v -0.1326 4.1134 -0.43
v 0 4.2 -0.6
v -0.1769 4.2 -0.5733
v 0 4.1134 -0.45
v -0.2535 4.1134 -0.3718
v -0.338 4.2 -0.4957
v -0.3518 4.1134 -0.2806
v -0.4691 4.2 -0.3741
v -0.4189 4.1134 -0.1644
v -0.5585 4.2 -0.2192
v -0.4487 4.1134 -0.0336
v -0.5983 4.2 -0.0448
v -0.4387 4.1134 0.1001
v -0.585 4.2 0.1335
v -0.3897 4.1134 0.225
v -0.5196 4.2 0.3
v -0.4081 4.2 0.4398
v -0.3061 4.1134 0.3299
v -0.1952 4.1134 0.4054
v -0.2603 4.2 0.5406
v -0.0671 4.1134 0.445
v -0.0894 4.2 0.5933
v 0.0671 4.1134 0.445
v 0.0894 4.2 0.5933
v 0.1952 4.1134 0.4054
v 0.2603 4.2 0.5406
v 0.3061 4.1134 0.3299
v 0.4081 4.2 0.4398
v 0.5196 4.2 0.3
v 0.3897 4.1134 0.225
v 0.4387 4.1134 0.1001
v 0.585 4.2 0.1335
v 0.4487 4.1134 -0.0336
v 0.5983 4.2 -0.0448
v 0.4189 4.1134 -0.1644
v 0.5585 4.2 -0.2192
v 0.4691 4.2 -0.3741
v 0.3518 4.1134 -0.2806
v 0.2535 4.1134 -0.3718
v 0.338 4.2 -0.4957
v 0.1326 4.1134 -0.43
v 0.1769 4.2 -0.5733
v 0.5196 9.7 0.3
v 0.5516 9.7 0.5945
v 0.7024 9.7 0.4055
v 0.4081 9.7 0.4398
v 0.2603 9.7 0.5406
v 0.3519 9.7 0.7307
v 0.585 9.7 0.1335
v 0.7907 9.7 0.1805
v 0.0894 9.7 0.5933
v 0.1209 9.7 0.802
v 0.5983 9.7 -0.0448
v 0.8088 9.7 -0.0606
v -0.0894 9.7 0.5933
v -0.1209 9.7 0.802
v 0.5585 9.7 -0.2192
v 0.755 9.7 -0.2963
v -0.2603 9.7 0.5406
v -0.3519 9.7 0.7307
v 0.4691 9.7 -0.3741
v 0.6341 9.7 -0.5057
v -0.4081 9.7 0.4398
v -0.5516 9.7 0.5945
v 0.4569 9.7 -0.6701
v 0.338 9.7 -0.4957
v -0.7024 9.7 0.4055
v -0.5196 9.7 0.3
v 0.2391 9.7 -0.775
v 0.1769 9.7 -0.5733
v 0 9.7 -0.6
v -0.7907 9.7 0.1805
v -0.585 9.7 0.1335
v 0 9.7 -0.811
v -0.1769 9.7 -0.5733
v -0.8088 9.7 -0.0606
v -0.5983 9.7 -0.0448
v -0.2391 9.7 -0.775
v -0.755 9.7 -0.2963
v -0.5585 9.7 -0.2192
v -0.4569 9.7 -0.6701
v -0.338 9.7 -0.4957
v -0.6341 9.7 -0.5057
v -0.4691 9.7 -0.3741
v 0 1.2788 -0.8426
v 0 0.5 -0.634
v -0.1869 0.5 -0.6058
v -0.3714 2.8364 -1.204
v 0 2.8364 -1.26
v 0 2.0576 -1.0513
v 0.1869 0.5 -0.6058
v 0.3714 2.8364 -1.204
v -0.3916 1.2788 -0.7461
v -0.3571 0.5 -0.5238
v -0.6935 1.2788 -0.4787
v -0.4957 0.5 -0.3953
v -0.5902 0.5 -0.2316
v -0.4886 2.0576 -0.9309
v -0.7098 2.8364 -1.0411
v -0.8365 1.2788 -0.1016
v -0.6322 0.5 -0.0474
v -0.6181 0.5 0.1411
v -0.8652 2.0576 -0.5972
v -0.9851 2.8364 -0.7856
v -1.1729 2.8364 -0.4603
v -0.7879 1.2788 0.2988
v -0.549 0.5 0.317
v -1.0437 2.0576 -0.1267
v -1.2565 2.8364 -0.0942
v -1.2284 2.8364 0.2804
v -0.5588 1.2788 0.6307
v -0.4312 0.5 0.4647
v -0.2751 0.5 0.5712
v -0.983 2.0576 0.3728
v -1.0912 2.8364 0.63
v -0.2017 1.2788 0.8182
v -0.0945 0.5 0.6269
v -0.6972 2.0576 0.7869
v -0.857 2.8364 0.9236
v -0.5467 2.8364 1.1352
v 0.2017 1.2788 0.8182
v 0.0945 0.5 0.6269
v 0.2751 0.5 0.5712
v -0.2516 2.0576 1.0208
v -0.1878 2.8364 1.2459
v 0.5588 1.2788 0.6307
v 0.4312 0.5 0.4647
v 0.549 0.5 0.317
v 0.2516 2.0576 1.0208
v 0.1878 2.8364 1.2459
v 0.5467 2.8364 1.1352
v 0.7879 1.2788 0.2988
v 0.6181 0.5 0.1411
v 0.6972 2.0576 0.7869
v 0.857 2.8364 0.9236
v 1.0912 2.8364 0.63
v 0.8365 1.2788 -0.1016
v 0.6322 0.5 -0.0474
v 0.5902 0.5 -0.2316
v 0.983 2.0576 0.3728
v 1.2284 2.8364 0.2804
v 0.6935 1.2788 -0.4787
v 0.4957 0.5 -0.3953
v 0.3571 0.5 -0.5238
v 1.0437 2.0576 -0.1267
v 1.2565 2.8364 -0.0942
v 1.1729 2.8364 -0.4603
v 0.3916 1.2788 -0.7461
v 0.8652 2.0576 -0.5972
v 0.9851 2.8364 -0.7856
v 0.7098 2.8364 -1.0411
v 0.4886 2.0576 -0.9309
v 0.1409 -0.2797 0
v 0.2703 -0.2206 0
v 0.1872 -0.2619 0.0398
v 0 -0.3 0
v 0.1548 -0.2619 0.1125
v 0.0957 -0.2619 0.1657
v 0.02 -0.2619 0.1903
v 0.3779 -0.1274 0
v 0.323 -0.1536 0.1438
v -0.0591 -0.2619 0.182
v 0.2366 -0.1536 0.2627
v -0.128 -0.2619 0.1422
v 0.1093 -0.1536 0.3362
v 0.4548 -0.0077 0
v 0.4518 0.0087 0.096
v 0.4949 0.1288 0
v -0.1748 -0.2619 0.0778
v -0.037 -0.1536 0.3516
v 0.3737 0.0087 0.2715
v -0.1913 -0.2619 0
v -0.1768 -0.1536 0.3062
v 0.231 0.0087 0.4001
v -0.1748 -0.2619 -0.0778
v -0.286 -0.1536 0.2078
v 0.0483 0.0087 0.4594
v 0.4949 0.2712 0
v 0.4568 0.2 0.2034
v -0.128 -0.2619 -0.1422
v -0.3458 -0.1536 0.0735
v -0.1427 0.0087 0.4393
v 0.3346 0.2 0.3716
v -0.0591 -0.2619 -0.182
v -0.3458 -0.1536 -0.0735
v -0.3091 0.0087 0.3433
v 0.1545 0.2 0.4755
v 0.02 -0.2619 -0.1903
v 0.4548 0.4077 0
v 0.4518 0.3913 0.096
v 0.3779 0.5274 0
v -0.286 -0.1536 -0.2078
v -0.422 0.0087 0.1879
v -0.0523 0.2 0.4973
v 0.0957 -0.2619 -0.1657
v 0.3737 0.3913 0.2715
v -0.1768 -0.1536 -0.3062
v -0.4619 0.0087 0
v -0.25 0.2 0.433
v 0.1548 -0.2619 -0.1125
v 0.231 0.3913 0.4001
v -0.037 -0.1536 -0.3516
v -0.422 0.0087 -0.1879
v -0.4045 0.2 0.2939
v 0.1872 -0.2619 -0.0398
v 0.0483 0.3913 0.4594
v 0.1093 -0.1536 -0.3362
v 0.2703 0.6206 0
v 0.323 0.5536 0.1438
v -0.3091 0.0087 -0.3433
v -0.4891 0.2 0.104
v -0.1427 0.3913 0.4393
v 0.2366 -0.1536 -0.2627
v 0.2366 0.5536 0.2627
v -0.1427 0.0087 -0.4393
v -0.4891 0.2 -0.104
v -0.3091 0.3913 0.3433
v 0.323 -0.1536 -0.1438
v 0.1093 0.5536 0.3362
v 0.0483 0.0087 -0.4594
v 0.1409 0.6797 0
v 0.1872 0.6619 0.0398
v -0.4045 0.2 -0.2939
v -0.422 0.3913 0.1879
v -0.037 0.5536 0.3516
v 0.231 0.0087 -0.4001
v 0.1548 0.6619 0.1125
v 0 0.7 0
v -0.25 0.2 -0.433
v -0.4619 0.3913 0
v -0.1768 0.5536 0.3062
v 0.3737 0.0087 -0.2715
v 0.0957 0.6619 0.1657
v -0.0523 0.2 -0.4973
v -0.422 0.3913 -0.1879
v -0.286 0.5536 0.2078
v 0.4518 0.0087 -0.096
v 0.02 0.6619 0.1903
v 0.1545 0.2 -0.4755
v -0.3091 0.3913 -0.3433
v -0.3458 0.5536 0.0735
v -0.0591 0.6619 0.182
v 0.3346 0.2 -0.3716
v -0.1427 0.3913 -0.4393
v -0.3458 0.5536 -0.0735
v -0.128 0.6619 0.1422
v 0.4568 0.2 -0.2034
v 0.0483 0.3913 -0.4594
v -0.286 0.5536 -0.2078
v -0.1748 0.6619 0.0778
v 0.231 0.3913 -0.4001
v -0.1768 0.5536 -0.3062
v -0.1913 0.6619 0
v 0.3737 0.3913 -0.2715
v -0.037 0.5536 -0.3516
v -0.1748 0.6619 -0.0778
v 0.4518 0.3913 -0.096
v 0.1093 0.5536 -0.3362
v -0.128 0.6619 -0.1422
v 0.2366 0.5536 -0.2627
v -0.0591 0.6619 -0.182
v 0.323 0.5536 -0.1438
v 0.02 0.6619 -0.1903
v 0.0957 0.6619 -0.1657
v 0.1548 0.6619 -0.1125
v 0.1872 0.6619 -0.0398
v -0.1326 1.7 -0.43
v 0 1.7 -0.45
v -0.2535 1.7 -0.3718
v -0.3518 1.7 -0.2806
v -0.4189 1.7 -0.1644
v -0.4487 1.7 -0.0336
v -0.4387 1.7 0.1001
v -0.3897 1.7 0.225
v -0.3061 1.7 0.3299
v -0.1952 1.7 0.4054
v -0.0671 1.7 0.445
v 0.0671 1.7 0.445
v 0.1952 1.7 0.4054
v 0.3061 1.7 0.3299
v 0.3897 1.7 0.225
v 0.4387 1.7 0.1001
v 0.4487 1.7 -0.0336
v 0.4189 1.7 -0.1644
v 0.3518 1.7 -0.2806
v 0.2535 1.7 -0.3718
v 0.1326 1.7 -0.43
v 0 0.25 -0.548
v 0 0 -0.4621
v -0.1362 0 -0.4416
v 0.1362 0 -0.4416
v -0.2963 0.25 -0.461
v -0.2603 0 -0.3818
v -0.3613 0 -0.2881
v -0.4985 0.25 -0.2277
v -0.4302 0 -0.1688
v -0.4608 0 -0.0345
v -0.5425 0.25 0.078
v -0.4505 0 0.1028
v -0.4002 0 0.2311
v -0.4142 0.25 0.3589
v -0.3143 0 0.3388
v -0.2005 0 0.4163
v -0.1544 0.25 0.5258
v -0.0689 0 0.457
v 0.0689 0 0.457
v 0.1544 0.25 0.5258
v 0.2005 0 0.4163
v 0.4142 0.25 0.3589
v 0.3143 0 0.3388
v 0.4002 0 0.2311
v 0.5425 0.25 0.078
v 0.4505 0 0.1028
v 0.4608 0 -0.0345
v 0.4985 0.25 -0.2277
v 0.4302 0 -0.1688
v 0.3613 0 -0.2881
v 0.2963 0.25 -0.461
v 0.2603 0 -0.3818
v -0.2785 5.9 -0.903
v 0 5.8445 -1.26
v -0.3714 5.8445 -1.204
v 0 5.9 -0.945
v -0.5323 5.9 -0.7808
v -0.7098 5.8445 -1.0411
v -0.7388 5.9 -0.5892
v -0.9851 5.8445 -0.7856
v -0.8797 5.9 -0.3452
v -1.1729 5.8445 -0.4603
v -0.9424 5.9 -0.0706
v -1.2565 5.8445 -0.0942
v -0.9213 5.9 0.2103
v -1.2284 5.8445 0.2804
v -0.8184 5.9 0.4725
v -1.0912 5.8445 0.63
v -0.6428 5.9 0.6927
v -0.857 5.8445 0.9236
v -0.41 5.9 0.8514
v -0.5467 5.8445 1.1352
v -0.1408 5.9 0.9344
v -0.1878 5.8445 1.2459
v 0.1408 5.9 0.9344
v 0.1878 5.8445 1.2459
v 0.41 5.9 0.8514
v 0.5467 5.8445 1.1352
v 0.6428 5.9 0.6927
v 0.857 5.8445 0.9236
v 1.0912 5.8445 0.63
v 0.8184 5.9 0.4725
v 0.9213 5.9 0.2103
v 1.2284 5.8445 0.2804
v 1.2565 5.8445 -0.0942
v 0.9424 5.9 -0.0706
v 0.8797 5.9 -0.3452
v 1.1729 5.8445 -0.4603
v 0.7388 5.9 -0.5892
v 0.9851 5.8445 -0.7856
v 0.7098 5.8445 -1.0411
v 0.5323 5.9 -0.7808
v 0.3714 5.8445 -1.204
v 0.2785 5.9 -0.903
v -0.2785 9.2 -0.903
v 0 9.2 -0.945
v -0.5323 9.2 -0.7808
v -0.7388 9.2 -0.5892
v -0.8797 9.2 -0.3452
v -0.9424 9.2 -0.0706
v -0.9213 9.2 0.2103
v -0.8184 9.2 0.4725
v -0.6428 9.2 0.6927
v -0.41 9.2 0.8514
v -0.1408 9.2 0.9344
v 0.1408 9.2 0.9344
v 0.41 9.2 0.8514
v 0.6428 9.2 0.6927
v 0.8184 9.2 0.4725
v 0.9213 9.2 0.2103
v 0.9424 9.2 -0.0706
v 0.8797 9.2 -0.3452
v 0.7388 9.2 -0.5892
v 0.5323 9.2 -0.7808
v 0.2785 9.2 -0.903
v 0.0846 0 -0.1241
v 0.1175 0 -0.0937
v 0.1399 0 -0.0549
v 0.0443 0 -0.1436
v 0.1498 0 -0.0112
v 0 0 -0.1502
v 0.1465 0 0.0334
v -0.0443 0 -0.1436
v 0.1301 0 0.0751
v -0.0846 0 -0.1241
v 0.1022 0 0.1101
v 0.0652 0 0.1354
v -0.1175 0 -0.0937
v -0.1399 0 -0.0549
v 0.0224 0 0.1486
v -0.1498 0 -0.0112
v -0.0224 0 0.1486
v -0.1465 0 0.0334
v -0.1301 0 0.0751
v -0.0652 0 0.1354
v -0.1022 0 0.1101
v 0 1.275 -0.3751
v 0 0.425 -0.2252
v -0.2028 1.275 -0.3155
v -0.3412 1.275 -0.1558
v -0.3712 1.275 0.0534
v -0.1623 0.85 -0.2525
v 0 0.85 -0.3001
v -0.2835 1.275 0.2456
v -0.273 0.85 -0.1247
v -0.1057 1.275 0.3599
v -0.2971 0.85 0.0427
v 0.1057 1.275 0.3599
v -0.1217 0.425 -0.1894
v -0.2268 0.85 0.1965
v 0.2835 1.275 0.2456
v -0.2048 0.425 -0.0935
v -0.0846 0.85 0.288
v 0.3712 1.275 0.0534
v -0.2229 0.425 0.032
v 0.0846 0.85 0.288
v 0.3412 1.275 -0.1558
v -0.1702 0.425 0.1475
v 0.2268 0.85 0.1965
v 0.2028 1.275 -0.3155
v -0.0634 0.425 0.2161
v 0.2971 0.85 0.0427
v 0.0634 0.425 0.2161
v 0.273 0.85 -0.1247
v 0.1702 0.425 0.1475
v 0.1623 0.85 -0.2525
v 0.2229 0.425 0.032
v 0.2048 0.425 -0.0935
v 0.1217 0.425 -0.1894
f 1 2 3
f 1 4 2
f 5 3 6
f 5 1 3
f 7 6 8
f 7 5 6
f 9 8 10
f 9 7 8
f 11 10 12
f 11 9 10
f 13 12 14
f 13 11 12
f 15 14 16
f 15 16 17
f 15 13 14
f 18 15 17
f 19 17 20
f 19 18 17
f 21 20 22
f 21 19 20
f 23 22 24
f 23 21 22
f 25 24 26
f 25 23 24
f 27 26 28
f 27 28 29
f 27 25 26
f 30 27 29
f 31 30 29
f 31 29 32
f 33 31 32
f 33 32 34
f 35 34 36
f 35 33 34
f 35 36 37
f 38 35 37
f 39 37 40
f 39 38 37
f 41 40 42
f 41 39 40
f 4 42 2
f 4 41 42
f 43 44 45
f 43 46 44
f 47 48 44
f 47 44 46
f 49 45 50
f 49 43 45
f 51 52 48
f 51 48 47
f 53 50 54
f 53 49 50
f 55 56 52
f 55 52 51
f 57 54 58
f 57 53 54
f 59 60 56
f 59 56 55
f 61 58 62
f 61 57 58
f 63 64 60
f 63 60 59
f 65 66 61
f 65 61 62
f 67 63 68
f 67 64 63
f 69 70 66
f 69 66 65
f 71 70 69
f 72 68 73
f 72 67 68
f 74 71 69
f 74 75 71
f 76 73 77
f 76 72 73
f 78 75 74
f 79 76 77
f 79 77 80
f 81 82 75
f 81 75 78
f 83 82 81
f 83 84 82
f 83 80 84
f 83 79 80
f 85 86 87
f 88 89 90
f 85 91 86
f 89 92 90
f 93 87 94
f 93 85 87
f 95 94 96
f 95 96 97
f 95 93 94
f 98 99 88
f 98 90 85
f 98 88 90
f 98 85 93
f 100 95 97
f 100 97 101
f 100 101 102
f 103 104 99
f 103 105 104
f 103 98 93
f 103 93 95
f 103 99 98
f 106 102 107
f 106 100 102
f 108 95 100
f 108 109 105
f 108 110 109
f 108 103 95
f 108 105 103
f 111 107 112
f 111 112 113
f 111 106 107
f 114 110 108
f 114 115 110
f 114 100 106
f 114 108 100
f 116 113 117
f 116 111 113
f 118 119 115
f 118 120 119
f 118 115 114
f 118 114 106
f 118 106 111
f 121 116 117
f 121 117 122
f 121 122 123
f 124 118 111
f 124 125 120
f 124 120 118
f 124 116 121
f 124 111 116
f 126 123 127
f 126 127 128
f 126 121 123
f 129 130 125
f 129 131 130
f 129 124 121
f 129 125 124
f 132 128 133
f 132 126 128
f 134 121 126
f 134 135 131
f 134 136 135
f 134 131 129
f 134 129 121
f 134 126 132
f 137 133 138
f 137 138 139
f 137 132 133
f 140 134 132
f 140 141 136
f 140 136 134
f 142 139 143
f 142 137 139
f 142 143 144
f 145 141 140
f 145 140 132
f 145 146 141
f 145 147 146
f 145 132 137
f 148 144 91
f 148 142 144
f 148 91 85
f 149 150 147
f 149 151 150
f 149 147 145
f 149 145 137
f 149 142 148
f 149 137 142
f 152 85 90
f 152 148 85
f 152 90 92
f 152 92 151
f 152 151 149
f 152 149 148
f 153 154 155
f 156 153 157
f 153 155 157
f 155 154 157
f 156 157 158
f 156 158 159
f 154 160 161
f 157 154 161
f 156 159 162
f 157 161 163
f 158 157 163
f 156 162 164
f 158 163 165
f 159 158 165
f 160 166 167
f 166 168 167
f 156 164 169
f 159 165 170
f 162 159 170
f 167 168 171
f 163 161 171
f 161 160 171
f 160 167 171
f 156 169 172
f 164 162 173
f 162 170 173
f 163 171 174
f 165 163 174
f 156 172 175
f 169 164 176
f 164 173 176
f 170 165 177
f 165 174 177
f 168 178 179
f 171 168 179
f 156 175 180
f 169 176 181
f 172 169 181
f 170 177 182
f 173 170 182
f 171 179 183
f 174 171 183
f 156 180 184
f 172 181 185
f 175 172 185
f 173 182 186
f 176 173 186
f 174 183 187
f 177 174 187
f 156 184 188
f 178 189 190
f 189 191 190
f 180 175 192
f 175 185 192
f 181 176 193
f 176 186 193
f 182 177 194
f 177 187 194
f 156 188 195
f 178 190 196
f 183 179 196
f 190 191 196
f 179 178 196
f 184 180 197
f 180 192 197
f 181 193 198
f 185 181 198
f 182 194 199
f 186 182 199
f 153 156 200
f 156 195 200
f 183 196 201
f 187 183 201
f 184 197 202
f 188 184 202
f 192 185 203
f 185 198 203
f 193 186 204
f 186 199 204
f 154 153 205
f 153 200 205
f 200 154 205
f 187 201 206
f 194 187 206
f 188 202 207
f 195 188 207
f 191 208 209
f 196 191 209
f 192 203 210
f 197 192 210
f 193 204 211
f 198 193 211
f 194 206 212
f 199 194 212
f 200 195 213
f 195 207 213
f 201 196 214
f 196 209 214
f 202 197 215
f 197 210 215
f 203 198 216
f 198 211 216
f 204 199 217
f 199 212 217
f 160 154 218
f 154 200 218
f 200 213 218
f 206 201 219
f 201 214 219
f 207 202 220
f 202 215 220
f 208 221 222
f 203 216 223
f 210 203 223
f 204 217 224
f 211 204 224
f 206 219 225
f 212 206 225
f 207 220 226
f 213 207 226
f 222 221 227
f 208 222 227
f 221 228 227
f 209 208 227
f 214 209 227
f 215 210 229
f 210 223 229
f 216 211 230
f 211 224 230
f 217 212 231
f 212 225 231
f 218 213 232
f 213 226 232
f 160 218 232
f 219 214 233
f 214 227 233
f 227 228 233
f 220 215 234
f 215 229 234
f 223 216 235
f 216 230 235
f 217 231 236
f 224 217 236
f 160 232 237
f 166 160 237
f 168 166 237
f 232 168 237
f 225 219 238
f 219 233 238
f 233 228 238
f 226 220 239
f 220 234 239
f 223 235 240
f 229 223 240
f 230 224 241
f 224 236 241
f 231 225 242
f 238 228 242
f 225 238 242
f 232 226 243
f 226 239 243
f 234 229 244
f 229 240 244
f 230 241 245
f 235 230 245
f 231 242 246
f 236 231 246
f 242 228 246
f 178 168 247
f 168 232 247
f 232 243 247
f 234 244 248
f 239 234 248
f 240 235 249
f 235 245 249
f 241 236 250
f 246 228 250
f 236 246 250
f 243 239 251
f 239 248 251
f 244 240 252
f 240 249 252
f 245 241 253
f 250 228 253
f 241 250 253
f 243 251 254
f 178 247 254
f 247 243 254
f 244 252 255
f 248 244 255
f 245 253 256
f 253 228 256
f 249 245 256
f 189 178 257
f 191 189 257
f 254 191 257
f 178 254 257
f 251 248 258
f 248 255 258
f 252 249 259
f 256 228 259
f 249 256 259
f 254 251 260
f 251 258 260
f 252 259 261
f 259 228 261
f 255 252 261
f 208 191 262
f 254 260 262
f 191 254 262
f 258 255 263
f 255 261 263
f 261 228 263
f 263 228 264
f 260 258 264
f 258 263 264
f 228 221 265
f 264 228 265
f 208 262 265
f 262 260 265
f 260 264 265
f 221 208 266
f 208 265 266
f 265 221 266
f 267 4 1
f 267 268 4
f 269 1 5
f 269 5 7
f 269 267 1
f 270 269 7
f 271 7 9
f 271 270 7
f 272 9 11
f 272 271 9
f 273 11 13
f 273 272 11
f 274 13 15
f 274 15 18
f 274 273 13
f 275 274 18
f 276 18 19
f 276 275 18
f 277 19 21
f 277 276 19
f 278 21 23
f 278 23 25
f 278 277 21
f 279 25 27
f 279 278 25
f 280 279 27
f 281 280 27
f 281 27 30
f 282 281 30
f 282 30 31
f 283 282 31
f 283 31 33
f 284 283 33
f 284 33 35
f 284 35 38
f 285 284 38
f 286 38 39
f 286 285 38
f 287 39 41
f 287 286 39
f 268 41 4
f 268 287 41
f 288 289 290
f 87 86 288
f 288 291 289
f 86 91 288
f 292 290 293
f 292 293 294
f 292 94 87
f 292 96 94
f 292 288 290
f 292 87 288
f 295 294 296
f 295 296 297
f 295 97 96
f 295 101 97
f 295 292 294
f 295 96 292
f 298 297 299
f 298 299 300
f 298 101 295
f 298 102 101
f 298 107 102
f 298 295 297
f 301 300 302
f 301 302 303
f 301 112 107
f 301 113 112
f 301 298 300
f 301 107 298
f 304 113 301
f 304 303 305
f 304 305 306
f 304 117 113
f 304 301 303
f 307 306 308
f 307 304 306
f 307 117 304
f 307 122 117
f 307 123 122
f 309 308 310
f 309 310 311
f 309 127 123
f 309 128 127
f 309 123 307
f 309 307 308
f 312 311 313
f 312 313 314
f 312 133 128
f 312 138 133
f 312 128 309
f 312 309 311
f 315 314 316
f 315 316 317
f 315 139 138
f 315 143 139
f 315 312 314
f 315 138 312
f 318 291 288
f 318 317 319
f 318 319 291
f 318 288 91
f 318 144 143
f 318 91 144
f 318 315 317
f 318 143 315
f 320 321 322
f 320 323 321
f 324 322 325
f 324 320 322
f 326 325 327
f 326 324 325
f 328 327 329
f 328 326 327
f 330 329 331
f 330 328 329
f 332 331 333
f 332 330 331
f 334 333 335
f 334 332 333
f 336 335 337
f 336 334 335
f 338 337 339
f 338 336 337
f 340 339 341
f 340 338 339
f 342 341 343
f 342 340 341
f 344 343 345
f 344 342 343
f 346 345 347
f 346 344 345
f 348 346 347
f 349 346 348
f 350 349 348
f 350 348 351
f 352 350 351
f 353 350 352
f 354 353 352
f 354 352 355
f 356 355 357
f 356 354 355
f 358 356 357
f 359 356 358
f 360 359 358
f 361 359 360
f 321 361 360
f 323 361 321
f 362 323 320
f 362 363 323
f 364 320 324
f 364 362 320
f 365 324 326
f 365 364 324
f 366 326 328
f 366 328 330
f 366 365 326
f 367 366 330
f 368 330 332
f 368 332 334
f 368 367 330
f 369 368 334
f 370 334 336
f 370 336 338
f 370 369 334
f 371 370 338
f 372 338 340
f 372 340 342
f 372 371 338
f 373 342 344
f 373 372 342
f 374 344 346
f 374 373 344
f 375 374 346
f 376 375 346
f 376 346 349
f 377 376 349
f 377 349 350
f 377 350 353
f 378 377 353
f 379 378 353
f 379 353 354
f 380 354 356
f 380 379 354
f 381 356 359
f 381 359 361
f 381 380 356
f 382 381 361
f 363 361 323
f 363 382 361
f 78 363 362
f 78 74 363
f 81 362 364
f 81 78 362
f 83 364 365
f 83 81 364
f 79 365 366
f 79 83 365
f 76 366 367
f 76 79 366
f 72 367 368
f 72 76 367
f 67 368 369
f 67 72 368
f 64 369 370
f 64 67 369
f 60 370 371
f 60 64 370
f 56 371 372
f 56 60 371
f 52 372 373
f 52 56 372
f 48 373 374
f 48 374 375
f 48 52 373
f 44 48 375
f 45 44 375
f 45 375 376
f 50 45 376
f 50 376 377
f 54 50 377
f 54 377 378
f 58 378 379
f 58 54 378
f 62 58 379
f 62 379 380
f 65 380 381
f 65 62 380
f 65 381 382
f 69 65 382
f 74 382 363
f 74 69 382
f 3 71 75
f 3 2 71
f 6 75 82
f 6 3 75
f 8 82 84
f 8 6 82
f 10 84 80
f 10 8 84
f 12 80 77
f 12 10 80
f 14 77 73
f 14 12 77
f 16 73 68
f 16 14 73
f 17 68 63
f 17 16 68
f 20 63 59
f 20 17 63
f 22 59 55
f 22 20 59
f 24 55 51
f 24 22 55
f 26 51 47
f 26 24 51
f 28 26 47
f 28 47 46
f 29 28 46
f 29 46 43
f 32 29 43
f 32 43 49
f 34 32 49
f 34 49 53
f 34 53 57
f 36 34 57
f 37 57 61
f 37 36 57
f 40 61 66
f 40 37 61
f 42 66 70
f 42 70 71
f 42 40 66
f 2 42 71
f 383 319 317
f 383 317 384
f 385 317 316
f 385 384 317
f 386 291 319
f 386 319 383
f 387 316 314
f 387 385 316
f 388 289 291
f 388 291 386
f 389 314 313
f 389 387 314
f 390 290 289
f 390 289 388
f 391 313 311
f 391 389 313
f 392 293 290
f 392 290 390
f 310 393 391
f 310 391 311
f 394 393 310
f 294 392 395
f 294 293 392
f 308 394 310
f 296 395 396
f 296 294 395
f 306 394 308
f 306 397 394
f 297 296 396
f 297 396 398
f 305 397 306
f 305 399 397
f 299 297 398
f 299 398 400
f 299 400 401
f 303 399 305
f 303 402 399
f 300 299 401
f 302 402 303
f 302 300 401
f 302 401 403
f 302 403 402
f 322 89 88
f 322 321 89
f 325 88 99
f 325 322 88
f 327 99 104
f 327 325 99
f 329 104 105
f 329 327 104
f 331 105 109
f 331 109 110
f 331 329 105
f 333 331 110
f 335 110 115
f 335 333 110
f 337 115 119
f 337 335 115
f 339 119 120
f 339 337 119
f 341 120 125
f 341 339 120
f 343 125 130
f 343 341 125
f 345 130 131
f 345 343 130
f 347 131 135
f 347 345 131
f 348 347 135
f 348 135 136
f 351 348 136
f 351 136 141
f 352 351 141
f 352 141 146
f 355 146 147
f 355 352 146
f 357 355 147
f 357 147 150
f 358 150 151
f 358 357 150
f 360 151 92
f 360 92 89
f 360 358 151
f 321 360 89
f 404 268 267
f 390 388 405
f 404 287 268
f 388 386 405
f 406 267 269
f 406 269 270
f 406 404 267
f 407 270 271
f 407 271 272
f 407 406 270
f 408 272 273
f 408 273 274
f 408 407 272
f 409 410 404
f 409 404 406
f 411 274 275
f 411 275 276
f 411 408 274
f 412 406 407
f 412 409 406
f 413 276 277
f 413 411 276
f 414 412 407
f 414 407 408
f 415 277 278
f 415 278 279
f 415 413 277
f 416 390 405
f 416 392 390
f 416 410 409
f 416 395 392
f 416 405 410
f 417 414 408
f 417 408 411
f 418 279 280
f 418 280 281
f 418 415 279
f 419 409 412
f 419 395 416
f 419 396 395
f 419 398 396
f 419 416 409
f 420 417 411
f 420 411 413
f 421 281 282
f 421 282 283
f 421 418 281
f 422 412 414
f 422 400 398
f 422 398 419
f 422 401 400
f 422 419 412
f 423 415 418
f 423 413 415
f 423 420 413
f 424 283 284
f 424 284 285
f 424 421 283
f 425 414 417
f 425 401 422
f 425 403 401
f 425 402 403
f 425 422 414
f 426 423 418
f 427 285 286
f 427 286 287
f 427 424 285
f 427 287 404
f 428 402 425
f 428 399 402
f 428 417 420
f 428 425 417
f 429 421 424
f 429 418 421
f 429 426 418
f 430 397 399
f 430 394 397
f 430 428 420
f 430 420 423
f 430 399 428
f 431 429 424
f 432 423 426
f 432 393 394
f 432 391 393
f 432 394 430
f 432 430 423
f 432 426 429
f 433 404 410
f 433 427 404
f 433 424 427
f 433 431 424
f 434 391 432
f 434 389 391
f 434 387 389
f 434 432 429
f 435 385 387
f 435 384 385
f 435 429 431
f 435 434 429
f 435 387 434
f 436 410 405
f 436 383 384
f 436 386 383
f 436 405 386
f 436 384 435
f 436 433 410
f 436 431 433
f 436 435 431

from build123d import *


with BuildPart() as part:
    # Esboço1 → Revolução1 (revolve)
    with BuildSketch(Plane.XY, mode=Mode.PRIVATE) as revolu_o1_sk:
        Polygon((0.633974596, 0.5), (1.26, 2.836358614), (1.26, 5.844457001), (0.945, 5.9), (0.945, 9.2), (0.811025404, 9.7), (0.6, 9.7), (0.6, 4.2), (0.45, 4.11339746), (0.45, 1.7), (0.150244133, 0), (0.462113614, 0), align=None)
    revolve(revolu_o1_sk.sketch.rotate(Axis((0, 0, 0), (0, 1, 0)), 90), axis=Axis((0, 0, 0), (0, 1, 0)))


with BuildPart() as body_2:
    # Esboço2 → Revolução2 (revolve)
    with BuildSketch(Plane.XY):
        with BuildLine():
            Line((0, 0.7), (0, -0.3))
            ThreePointArc((0, -0.3), (0.5, 0.2), (0, 0.7))
        make_face()
    revolve(axis=Axis((0, 0.7, 0), (0, -1, 0)))


solid = Compound([part.part, body_2.part])
